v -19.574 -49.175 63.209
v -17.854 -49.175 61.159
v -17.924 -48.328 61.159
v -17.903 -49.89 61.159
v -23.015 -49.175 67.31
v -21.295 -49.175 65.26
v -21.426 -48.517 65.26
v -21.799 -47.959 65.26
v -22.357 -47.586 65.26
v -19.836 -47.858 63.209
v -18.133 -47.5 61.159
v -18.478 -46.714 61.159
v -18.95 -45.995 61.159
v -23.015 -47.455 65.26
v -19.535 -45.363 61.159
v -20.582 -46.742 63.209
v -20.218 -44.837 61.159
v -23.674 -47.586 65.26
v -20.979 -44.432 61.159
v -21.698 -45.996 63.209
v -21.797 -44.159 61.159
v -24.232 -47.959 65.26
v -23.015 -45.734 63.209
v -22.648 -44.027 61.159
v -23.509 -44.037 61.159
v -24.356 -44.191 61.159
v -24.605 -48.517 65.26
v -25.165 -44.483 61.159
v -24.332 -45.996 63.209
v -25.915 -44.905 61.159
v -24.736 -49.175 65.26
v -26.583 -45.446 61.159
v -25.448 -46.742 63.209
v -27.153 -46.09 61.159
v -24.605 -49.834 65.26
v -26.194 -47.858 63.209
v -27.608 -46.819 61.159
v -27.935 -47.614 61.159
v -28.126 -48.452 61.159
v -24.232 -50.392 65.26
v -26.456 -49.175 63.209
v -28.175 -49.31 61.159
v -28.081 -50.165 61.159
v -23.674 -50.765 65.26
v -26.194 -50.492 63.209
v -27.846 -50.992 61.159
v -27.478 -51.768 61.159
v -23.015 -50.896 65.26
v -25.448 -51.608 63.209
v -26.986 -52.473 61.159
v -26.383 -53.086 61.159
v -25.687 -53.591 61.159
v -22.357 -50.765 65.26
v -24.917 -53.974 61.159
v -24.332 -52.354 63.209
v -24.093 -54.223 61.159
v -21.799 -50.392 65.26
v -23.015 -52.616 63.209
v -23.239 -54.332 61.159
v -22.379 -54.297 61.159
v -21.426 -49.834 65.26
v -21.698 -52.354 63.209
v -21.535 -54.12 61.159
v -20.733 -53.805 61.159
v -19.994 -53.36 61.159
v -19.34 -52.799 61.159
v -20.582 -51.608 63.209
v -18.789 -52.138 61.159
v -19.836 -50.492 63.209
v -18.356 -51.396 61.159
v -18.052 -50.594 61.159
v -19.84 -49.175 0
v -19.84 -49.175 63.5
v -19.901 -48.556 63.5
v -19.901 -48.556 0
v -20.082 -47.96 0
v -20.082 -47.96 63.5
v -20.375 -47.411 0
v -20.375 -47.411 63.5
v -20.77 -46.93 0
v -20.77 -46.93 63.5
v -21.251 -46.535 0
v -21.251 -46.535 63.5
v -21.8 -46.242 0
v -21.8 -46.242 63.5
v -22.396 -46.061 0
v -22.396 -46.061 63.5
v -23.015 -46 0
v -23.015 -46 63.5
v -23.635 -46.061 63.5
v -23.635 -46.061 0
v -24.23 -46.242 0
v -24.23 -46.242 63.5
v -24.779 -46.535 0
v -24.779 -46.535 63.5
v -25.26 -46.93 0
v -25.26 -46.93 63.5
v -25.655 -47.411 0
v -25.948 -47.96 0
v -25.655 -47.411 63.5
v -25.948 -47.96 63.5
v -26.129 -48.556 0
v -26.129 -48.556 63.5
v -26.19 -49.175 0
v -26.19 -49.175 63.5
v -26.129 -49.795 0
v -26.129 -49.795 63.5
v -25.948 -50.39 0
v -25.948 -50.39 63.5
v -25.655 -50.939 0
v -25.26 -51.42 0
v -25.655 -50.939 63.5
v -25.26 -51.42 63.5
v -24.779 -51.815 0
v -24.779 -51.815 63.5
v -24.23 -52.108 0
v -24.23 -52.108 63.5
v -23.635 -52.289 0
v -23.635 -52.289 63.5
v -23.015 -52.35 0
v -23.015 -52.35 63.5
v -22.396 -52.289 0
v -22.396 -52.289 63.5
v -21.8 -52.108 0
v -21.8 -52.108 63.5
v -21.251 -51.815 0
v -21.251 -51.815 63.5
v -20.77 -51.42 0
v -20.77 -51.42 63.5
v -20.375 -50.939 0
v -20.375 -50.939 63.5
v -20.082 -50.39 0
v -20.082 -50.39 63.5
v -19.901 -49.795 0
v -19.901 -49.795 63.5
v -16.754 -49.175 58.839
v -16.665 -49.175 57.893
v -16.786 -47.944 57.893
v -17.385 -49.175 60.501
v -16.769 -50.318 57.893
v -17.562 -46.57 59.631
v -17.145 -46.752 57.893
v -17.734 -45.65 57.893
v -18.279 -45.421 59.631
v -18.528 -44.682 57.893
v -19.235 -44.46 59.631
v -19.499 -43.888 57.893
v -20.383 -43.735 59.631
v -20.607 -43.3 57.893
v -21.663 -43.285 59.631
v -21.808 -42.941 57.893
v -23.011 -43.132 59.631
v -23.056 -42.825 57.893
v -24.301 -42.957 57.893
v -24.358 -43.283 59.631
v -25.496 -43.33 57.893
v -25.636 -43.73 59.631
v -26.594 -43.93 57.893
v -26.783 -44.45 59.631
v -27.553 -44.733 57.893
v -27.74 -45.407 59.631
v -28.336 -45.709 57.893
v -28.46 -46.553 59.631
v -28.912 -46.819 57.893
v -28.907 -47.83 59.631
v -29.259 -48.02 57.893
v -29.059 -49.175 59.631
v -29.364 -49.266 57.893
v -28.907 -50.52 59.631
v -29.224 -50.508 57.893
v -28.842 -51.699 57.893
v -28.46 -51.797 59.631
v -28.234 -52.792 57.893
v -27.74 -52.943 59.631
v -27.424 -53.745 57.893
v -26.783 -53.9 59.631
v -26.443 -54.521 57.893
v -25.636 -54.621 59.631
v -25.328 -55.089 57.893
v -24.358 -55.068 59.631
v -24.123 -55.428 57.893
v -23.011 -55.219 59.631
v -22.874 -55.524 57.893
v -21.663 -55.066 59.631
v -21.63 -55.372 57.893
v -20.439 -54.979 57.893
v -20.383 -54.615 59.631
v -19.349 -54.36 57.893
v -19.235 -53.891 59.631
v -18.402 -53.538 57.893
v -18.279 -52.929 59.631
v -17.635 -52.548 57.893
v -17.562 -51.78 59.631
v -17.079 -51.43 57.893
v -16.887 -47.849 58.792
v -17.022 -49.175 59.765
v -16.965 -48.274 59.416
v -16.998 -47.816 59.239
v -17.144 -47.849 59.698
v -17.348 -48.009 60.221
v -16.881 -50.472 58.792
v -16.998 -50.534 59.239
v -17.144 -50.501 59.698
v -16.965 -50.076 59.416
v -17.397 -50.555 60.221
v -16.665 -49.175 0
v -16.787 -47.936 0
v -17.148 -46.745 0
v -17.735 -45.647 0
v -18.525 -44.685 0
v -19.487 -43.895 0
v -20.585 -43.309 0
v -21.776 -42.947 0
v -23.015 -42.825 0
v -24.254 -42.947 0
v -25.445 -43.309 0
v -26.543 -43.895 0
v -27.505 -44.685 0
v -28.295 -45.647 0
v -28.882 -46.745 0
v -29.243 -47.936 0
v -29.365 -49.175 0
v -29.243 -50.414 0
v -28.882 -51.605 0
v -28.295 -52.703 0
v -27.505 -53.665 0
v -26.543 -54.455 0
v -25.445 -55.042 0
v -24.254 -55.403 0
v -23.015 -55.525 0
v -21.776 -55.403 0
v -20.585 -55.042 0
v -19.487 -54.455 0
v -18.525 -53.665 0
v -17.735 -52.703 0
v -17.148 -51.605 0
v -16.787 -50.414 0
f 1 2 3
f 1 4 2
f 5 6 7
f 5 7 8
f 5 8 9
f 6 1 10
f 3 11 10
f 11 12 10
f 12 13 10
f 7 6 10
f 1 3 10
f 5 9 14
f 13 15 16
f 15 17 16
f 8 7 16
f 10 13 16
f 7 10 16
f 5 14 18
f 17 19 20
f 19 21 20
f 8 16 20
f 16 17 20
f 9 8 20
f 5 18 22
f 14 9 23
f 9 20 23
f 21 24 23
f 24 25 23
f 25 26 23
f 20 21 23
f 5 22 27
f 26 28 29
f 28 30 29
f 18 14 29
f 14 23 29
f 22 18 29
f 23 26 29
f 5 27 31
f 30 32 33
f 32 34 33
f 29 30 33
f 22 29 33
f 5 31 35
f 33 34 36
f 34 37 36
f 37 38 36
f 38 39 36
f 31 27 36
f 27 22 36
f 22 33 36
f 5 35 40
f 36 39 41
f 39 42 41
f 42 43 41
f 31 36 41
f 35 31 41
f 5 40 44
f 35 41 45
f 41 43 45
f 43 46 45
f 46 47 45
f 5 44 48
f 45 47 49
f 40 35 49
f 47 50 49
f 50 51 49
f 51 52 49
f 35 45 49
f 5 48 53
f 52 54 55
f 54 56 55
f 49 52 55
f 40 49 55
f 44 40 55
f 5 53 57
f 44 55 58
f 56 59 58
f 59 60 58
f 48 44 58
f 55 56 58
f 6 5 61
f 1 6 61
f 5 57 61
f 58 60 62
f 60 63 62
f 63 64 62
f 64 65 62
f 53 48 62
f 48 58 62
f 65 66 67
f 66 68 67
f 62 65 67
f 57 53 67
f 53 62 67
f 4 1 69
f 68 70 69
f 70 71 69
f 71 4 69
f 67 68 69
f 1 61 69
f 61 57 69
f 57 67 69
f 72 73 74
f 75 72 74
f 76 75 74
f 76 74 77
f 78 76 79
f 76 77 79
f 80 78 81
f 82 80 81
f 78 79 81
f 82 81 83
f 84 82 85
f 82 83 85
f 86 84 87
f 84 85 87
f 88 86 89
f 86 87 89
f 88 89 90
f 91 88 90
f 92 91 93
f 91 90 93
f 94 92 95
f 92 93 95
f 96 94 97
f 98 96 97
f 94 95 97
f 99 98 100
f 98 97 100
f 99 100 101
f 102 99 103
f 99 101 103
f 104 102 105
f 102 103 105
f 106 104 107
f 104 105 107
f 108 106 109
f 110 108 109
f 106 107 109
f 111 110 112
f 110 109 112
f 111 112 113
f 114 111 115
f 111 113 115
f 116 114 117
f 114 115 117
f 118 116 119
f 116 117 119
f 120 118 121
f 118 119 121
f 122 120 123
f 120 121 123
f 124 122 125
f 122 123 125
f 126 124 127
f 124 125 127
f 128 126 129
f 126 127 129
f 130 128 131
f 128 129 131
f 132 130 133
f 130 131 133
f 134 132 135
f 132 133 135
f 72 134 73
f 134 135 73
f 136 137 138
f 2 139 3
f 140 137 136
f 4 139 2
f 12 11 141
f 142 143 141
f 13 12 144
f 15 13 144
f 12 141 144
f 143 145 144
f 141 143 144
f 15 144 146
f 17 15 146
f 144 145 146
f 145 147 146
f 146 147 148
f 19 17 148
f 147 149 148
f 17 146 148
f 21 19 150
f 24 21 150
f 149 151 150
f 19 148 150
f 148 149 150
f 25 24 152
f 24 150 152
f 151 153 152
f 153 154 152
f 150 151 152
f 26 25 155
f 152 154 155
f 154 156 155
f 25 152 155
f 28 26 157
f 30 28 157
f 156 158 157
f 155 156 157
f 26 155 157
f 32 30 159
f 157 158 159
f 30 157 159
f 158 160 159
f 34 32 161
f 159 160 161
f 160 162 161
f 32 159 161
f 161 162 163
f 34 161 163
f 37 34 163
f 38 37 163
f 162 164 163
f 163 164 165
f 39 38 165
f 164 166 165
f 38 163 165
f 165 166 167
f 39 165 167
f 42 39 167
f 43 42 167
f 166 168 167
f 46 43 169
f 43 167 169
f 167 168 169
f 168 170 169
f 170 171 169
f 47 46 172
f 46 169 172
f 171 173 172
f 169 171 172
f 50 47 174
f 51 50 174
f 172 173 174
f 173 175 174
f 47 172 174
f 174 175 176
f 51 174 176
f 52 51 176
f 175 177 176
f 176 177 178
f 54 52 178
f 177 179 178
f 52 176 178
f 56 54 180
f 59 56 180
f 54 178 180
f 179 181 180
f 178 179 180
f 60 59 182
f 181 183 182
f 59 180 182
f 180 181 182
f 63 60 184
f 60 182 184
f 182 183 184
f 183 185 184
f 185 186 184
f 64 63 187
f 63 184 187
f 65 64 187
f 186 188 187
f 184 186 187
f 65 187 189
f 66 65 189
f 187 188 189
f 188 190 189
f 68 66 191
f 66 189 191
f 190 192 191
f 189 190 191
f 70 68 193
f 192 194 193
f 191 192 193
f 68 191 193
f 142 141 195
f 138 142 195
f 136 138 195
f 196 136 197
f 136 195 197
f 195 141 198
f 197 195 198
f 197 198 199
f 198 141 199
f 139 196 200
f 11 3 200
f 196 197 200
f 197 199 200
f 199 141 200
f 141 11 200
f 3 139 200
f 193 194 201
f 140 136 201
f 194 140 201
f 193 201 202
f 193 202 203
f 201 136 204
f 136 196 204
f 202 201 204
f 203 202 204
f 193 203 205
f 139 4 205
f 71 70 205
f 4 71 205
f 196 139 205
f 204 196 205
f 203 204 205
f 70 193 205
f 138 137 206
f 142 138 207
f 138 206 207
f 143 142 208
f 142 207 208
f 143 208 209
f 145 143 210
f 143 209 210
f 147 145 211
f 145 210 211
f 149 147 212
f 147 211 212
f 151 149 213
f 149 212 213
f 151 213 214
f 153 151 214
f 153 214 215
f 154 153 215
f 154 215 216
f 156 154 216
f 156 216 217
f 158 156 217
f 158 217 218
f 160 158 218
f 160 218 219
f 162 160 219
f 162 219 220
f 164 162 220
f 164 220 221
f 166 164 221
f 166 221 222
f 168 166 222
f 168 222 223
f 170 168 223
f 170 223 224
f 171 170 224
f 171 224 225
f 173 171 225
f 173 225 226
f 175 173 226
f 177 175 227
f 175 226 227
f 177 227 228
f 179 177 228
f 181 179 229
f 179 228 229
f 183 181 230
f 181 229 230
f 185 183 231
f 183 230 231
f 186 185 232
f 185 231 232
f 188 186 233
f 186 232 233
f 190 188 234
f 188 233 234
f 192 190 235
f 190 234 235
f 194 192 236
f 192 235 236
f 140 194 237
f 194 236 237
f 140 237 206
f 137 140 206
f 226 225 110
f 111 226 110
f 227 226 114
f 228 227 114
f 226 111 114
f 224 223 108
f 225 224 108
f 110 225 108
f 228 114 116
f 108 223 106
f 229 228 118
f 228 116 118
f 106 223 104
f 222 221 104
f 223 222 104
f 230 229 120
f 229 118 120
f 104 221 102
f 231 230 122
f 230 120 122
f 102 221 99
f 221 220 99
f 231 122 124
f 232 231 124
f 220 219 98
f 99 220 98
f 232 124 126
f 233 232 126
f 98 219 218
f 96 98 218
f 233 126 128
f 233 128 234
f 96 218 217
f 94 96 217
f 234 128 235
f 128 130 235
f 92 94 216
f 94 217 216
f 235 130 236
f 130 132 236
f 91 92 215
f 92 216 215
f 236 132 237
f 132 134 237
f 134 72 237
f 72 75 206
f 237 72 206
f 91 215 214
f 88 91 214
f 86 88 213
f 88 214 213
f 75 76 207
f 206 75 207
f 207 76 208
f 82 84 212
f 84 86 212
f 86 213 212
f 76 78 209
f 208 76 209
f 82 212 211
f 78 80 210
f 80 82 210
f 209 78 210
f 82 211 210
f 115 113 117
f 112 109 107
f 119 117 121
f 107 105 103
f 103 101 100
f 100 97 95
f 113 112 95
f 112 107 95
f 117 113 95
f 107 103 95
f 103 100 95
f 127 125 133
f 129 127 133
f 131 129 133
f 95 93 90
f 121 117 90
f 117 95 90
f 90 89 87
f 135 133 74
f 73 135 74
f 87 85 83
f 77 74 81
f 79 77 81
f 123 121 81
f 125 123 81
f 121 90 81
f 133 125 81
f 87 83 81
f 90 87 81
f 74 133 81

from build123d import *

# Parameters (mm, degrees)
F0_R     = 6.35
F1_DEPTH = 63.5
F3_R     = 6.35
F4_DEPTH = 3.81
F5_D     = 6.35
F5_DEPTH = 63.5
F5_TIP   = 1.9077324654
F6_SIZE2 = 7.567635313
F6_SIZE  = 6.35
F7_R     = 5.08


with BuildPart() as f1:
    # F0 (on Top) → F1 (new body)
    with BuildSketch(Plane.XY):
        with Locations((-23.0151098222, -49.1751506925)):
            Circle(F0_R)
    extrude(amount=F1_DEPTH)

    # F3 (on face) → F4 (join)
    with BuildSketch(Plane.XY.offset(63.5)):
        with Locations((-23.0151098222, -49.1751506925)):
            Circle(F3_R)
    extrude(amount=F4_DEPTH)

    # F5 (one way)
    with BuildSketch(Plane.XY.offset(63.5)):
        with Locations((-23.0151098222, -49.1751506925)):
            Circle(F5_D / 2)
    extrude(amount=-F5_DEPTH, mode=Mode.SUBTRACT)
    with Locations(Plane.XY.offset(63.5)):
        with Locations((-23.0151098222, -49.1751506925)):
            with Locations((0, 0, -(F5_DEPTH + F5_TIP / 2))):  # 118° drill point
                Cone(0, F5_D / 2, F5_TIP, mode=Mode.SUBTRACT)

    # F6
    f6_edges = [f1.edges().sort_by_distance(p)[0] for p in [
        (-29.36511, -49.175151, 67.31),
    ]]
    f6_side = f1.faces().sort_by_distance((-23.01511, -49.175151, 67.31))[0]
    chamfer(f6_edges, length=F6_SIZE, length2=F6_SIZE2, reference=f6_side)

    # F7
    f7_edges = [f1.edges().sort_by_distance(p)[0] for p in [
        (-29.36511, -49.175151, 59.742365),
    ]]
    fillet(f7_edges, radius=F7_R)


solid = f1.part
